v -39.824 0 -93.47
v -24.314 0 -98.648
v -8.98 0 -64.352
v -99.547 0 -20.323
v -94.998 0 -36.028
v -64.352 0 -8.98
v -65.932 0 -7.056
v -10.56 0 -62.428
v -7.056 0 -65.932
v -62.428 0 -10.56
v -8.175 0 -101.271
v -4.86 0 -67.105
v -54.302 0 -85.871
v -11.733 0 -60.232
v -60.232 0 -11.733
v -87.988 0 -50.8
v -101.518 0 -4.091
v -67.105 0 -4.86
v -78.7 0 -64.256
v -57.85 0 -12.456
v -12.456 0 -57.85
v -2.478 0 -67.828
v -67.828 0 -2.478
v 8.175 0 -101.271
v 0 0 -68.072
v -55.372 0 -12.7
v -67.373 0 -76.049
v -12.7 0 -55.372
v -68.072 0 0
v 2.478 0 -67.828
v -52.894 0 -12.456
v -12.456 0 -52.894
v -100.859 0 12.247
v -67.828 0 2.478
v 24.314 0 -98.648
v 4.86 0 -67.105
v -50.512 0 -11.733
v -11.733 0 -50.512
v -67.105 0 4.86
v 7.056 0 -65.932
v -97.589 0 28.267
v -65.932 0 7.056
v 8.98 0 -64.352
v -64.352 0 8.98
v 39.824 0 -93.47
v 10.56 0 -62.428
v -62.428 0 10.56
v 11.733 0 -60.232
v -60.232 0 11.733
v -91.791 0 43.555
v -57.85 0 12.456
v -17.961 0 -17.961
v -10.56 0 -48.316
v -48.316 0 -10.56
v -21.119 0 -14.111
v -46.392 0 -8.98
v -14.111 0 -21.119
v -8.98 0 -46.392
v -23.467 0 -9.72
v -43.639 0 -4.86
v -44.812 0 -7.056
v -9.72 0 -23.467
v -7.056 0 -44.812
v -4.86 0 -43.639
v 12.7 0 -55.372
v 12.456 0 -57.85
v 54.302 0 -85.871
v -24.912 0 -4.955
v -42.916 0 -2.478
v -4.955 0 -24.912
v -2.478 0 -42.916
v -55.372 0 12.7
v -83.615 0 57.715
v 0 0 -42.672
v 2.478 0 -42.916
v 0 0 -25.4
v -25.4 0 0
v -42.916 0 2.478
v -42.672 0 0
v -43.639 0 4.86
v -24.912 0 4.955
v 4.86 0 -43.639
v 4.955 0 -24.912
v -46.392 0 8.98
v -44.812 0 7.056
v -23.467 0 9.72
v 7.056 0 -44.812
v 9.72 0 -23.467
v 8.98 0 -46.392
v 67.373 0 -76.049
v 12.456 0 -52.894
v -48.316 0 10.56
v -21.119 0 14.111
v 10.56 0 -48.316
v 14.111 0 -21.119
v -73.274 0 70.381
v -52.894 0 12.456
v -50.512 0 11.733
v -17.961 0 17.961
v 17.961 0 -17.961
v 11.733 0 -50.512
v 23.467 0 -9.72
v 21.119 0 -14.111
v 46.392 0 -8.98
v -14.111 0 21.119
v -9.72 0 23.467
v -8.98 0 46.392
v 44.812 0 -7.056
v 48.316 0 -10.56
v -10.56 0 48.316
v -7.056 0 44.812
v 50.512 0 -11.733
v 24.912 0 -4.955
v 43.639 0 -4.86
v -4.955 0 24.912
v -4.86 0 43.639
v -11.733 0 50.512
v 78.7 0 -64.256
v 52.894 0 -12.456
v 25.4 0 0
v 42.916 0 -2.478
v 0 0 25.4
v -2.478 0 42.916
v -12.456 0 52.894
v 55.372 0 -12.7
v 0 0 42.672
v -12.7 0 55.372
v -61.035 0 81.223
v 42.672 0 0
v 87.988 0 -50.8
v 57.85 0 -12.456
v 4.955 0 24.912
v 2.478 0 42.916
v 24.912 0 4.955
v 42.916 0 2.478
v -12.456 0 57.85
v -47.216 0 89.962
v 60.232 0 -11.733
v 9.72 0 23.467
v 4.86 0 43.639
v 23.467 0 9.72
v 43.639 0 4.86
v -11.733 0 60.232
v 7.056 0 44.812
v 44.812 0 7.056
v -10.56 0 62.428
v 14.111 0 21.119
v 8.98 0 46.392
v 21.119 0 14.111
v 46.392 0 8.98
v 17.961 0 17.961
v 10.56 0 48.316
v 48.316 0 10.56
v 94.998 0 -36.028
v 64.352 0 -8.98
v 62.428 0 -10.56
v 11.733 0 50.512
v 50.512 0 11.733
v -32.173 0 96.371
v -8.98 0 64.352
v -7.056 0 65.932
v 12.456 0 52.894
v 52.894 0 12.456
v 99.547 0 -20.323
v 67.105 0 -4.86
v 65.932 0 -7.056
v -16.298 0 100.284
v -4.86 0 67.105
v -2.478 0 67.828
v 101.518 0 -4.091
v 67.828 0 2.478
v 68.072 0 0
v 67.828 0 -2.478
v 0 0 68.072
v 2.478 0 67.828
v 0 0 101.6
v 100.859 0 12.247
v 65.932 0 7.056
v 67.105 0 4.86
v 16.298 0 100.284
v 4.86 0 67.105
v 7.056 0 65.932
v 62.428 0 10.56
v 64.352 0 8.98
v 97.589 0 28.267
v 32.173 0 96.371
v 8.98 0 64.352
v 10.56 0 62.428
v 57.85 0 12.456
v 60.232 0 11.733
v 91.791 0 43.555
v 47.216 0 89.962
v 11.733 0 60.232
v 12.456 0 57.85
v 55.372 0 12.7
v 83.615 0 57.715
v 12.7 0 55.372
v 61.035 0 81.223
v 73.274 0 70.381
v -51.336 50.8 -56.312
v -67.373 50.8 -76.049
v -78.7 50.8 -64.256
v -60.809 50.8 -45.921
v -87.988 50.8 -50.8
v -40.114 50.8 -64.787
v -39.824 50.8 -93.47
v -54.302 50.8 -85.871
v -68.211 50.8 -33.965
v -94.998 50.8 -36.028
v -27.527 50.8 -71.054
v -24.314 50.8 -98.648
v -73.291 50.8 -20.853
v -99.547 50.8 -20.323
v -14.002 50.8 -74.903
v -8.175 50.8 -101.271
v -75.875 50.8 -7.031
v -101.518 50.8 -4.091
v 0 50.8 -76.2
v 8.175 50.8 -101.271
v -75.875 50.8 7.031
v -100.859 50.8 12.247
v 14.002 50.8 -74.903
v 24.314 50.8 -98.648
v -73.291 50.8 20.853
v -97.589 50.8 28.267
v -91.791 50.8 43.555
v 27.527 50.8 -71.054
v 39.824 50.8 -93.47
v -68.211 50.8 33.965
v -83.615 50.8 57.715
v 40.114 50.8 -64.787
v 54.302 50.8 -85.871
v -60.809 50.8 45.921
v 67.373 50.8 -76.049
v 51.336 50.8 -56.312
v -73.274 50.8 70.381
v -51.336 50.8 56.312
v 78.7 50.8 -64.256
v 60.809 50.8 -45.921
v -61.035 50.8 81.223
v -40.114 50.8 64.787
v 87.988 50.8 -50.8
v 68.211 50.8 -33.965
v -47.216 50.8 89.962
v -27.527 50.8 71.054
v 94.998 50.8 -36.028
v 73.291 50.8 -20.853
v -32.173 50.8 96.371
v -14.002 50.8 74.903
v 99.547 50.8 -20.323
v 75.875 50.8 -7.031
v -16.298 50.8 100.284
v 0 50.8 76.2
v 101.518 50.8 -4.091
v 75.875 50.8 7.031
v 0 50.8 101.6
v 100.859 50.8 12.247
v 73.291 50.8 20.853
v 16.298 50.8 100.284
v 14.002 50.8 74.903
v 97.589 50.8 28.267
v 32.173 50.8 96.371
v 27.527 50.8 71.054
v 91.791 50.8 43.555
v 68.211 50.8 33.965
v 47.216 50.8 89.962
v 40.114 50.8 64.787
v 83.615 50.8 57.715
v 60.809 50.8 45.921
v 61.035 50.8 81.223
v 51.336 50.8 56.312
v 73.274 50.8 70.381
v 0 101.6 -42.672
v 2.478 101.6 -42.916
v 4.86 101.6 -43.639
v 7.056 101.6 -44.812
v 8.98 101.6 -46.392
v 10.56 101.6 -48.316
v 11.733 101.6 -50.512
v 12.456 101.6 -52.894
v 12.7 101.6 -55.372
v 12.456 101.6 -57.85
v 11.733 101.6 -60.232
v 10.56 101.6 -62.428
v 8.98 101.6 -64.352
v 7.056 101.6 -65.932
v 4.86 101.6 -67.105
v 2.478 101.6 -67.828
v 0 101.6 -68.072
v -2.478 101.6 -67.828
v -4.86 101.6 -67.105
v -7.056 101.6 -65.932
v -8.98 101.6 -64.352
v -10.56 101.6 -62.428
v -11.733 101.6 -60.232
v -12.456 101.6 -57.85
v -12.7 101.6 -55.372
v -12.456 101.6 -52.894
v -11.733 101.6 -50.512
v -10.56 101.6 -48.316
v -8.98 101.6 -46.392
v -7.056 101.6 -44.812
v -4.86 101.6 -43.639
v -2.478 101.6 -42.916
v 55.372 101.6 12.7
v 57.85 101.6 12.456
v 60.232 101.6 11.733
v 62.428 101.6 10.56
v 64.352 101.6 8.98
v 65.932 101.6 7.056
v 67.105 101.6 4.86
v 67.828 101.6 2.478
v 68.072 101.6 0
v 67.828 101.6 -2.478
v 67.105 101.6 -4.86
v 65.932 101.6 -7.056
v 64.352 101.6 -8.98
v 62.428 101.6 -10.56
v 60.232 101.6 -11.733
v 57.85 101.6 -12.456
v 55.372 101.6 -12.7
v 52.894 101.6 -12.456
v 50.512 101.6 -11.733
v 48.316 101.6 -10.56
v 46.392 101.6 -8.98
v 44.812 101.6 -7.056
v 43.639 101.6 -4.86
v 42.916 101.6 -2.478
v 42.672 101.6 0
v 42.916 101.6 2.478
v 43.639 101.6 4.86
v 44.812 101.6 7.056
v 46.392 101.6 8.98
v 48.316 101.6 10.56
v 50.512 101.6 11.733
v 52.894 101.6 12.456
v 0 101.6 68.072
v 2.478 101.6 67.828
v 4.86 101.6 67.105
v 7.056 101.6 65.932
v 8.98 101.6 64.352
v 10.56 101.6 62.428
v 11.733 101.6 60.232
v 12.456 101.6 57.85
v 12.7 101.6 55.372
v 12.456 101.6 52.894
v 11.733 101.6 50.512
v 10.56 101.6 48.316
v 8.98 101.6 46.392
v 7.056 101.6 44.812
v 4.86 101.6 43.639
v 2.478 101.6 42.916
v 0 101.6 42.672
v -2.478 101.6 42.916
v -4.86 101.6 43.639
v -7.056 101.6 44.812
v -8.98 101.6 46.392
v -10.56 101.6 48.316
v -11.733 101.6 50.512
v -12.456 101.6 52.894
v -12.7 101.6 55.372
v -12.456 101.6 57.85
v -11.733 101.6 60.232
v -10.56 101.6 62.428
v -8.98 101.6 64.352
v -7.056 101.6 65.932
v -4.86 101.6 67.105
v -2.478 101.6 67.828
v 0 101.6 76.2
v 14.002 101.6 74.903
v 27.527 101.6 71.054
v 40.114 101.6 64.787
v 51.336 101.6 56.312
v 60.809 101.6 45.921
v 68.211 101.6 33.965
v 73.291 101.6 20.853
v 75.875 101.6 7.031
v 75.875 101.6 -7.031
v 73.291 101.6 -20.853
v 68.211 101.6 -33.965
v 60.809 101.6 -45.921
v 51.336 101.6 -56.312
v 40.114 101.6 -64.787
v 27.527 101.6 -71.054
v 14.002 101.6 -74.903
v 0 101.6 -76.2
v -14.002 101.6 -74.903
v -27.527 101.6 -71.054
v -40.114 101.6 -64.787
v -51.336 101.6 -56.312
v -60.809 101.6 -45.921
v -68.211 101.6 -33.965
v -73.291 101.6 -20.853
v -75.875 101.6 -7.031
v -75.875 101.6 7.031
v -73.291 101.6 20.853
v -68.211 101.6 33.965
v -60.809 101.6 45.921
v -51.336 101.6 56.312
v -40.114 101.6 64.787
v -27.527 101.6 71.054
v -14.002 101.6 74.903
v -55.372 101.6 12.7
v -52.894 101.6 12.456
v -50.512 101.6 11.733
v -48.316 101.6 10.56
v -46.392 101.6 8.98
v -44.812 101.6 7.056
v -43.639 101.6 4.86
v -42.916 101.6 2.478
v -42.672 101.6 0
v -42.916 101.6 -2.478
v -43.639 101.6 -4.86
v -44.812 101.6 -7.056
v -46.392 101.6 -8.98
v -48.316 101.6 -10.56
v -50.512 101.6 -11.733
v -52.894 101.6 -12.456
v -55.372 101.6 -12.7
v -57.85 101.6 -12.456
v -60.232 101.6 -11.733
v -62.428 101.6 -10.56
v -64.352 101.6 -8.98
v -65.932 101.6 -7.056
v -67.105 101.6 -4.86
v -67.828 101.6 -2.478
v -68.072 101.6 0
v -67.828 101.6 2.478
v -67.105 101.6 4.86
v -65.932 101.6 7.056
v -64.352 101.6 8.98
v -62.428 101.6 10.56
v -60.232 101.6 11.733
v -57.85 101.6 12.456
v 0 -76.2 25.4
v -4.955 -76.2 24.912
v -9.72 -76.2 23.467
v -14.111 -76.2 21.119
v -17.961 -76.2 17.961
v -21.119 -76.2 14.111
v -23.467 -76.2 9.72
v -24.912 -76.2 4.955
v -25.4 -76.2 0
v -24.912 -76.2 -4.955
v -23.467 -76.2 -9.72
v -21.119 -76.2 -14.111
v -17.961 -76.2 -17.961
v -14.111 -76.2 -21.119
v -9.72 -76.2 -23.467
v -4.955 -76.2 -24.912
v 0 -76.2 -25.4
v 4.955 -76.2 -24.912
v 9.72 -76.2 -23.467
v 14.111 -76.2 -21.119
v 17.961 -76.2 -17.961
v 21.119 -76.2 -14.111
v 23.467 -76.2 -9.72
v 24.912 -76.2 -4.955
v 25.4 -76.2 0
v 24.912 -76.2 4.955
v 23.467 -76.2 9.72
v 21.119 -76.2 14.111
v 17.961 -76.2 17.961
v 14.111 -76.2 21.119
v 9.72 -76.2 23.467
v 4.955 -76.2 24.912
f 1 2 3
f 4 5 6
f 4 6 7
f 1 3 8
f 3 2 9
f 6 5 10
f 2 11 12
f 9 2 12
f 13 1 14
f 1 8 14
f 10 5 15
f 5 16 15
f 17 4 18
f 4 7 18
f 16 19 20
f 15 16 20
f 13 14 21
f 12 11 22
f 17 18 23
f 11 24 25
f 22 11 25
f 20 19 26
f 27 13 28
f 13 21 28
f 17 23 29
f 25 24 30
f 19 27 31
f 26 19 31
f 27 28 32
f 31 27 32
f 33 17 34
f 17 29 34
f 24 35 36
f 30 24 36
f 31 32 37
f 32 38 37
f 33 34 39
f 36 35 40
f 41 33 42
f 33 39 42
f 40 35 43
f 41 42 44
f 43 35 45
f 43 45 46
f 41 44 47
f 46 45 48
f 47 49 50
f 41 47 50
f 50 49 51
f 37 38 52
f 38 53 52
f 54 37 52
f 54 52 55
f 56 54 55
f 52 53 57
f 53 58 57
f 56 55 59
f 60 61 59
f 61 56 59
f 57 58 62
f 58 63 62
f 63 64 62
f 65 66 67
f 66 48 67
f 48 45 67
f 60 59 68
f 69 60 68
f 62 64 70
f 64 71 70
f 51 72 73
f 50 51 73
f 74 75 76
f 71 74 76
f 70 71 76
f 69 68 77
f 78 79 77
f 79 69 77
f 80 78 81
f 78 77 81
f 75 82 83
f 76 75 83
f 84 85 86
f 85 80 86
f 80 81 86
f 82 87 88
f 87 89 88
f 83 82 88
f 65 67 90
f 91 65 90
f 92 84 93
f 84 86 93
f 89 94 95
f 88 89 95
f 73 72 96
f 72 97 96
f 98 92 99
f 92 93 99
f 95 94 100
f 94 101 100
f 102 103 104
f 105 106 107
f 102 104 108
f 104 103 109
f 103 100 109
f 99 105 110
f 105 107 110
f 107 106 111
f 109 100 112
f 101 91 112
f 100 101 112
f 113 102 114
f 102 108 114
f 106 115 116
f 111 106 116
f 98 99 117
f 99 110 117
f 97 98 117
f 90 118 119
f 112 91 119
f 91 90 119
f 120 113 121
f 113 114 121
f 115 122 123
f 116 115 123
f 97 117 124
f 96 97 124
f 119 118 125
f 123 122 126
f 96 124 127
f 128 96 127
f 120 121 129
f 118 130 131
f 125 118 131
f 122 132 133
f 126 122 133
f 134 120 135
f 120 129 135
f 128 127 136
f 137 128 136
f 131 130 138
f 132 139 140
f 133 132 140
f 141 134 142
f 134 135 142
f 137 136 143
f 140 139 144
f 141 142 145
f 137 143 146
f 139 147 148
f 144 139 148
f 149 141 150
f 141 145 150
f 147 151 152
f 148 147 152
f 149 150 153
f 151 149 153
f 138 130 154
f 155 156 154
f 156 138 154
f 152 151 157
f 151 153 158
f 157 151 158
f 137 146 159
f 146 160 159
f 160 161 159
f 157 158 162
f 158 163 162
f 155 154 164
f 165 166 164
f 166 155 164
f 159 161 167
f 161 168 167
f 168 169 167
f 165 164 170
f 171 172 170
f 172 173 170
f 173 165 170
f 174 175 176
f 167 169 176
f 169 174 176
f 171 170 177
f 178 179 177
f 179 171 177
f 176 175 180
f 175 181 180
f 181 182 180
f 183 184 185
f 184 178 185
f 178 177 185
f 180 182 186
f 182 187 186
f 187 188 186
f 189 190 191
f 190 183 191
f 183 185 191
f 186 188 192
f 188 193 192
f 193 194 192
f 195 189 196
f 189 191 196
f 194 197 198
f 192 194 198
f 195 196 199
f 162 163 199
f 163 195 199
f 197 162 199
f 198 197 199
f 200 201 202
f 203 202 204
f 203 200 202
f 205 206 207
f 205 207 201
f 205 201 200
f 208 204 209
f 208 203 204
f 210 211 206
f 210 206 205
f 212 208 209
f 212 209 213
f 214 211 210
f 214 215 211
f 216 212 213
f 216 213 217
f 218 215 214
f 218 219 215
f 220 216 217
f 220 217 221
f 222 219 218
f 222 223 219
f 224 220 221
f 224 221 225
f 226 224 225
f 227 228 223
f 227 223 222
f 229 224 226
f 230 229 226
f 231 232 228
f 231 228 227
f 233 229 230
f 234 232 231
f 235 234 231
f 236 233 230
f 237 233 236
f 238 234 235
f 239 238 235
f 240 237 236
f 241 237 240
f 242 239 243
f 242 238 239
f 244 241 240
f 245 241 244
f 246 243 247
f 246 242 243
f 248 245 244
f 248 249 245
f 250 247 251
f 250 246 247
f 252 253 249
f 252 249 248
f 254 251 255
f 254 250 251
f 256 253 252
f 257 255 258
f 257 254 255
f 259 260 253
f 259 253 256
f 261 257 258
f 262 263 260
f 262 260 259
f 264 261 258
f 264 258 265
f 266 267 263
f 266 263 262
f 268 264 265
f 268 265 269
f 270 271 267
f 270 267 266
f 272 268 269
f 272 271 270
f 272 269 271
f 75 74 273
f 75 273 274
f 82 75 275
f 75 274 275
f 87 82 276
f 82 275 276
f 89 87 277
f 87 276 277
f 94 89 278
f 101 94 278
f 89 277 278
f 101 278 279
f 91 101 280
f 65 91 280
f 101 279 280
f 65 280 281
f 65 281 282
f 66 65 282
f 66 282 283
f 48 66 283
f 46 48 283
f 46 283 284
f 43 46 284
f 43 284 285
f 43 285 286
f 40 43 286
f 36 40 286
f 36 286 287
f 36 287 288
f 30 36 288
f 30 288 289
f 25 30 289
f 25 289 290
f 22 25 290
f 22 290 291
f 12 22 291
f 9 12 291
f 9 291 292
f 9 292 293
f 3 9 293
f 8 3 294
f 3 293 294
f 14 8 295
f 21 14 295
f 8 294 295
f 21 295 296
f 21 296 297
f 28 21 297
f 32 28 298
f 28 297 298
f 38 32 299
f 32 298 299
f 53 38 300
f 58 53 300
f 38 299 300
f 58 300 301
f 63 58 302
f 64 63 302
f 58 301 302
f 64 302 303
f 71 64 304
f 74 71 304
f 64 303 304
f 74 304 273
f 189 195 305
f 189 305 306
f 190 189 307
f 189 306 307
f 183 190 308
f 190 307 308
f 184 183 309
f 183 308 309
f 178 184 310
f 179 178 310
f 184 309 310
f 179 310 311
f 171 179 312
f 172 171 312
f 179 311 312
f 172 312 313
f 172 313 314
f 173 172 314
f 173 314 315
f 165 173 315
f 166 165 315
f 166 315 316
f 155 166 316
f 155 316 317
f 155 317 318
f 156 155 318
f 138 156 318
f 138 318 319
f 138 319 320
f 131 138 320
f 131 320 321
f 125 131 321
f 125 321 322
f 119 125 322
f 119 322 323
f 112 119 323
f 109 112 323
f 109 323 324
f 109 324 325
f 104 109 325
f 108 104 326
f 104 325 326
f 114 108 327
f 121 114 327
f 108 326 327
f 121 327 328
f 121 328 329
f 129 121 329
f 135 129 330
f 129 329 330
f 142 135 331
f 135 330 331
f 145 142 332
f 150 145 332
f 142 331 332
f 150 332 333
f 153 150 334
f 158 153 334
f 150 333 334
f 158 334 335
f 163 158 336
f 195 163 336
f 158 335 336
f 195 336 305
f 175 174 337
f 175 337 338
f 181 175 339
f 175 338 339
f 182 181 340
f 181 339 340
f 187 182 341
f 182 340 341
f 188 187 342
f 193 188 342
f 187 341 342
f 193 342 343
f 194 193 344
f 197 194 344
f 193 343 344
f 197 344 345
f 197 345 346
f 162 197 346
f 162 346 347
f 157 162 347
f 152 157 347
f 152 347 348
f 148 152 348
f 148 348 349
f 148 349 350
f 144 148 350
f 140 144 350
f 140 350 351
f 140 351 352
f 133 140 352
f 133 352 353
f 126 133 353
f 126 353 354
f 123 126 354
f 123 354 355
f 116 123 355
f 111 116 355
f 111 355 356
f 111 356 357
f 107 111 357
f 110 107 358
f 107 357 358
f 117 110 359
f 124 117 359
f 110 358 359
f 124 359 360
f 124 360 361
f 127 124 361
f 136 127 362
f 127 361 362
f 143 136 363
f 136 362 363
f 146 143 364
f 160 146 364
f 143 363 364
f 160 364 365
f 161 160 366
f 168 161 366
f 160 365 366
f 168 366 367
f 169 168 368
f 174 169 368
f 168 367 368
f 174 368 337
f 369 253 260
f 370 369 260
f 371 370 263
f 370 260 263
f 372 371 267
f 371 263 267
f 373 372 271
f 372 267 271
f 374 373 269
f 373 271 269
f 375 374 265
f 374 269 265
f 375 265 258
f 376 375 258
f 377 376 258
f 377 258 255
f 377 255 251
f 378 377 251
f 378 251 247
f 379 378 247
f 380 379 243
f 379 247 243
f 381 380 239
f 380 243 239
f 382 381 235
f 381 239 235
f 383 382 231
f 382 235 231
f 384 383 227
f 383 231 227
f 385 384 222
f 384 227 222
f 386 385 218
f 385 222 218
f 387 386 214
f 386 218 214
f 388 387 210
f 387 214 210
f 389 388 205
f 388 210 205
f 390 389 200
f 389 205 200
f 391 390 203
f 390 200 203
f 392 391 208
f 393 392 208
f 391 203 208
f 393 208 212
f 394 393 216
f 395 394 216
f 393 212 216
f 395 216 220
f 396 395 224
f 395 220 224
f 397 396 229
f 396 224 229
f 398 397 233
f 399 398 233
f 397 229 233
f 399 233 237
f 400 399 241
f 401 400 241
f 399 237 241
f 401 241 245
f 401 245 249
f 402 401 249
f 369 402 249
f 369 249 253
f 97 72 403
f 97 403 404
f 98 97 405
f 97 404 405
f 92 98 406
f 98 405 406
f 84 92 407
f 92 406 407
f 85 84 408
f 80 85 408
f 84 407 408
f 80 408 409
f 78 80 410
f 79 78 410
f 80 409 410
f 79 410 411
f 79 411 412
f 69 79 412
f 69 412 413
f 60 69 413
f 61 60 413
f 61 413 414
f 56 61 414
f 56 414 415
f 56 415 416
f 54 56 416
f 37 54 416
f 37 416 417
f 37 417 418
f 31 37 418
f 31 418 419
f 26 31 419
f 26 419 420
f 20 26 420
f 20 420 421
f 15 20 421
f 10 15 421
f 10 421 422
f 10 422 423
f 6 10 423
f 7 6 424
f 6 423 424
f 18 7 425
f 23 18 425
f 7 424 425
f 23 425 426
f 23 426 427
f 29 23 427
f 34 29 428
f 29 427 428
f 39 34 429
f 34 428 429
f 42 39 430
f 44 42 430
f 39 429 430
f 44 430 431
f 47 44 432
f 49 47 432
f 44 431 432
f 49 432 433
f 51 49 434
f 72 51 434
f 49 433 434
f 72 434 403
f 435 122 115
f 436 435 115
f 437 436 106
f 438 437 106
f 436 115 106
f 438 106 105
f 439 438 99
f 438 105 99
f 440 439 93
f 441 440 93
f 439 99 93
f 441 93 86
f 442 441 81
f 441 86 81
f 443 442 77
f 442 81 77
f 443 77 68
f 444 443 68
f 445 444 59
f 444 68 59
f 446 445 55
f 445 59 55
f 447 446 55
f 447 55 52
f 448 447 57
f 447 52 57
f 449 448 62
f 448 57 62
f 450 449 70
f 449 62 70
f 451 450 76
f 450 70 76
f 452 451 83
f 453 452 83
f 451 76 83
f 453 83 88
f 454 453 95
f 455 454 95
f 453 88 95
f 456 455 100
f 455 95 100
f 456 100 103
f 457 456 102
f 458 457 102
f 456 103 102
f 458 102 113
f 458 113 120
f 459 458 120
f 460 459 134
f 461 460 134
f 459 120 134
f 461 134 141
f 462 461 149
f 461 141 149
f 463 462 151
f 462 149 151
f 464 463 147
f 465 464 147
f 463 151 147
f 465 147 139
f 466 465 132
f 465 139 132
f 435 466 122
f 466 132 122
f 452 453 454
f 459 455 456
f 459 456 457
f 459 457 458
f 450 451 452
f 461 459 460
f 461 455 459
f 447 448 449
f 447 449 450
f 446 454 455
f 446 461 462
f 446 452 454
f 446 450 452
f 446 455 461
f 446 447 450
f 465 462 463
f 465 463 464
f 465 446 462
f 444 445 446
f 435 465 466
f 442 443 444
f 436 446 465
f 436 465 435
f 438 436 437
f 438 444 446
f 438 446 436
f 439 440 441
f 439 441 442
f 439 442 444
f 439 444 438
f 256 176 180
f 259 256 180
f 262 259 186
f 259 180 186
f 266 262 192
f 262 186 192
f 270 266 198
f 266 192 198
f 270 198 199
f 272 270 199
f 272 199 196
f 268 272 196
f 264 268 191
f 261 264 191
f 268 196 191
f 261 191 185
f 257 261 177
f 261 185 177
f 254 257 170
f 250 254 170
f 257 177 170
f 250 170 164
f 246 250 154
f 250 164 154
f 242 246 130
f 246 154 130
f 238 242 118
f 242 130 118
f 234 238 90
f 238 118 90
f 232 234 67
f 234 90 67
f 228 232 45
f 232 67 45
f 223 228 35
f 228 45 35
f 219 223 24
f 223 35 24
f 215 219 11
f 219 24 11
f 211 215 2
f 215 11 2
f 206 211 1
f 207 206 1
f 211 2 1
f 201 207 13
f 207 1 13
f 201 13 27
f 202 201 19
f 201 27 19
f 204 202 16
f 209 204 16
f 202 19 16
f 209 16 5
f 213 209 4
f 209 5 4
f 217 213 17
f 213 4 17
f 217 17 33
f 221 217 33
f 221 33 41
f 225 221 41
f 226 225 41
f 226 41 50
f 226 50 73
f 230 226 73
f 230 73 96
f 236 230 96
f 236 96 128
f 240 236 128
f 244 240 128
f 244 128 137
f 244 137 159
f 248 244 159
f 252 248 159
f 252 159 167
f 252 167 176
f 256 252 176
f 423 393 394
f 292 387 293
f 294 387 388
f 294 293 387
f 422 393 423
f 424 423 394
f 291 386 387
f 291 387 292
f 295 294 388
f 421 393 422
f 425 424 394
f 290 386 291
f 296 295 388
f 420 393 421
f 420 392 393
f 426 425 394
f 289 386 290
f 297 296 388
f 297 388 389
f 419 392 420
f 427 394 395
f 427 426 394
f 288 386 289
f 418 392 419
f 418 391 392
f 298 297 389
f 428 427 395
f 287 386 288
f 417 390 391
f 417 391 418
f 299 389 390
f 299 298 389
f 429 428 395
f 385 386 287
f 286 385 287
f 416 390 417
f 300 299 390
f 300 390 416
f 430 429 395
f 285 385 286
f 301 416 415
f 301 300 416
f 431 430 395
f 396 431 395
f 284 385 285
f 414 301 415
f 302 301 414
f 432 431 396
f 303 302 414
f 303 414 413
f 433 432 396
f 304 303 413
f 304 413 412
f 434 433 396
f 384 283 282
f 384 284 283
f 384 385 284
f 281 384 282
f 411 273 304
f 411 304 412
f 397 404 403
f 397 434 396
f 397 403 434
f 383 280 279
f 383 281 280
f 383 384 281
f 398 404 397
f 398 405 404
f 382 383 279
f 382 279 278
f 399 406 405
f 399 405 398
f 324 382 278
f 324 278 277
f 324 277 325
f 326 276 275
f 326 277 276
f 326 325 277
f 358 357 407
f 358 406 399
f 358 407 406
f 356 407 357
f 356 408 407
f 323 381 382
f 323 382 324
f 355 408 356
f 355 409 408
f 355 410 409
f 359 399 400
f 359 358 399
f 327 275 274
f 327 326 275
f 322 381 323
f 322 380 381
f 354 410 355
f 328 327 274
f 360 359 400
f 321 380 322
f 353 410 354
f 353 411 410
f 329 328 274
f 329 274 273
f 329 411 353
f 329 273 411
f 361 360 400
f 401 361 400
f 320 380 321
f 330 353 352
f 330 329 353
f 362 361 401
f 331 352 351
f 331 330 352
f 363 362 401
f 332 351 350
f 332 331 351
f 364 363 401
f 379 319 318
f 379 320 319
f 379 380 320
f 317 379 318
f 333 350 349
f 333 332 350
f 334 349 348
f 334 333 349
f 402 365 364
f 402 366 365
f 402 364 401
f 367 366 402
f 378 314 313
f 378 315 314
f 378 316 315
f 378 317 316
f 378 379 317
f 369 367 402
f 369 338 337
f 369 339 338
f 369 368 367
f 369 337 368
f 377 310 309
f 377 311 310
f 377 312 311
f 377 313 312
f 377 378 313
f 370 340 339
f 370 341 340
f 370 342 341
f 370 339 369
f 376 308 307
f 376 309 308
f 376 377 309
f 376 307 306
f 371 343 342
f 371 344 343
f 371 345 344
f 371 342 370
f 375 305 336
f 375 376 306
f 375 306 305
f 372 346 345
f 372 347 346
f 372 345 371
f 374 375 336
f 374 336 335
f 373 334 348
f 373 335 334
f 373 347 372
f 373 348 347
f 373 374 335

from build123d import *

# Parameters (mm, degrees)
SKETCH1_R           = 101.6
BOSS_EXTRUDE1_DEPTH = 50.8
SKETCH2_R           = 76.2
BOSS_EXTRUDE2_DEPTH = 50.8
SKETCH3_R           = 12.7
CUT_EXTRUDE1_DEPTH  = 176.976362049
SKETCH4_R           = 25.4
BOSS_EXTRUDE3_DEPTH = 76.2


with BuildPart() as part:
    # Sketch1 → Boss-Extrude1 (new body)
    with BuildSketch(Plane(origin=(0, 0, 0), x_dir=(1, 0, 0), z_dir=(0, 1, 0))):
        with Locations(Location((0, 0, 0), (0, 0, 270))):
            Circle(SKETCH1_R)
    extrude(amount=BOSS_EXTRUDE1_DEPTH)

    # Sketch2 → Boss-Extrude2 (add)
    with BuildSketch(Plane(origin=(0, 50.8, 0), x_dir=(1, 0, 0), z_dir=(0, 1, 0))):
        with Locations(Location((0, 0, 0), (0, 0, 270))):
            Circle(SKETCH2_R)
    extrude(amount=BOSS_EXTRUDE2_DEPTH)

    # Sketch3 → Cut-Extrude1 (cut, through all)
    with BuildSketch(Plane(origin=(0, 101.6, 0), x_dir=(1, 0, 0), z_dir=(0, 1, 0))):
        with Locations(Location((0, 55.372, 0), (0, 0, 270))):
            Circle(SKETCH3_R)
        with Locations(Location((-55.372, 0, 0), (0, 0, 270))):
            Circle(SKETCH3_R)
        with Locations(Location((0, -55.372, 0), (0, 0, 270))):
            Circle(SKETCH3_R)
        with Locations(Location((55.372, 0, 0), (0, 0, 270))):
            Circle(SKETCH3_R)
    extrude(amount=-CUT_EXTRUDE1_DEPTH, mode=Mode.SUBTRACT)

    # Sketch4 → Boss-Extrude3 (add)
    with BuildSketch(Plane.XZ):
        with Locations(Location((0, 0, 0), (0, 0, 90))):
            Circle(SKETCH4_R)
    extrude(amount=BOSS_EXTRUDE3_DEPTH)


solid = part.part
